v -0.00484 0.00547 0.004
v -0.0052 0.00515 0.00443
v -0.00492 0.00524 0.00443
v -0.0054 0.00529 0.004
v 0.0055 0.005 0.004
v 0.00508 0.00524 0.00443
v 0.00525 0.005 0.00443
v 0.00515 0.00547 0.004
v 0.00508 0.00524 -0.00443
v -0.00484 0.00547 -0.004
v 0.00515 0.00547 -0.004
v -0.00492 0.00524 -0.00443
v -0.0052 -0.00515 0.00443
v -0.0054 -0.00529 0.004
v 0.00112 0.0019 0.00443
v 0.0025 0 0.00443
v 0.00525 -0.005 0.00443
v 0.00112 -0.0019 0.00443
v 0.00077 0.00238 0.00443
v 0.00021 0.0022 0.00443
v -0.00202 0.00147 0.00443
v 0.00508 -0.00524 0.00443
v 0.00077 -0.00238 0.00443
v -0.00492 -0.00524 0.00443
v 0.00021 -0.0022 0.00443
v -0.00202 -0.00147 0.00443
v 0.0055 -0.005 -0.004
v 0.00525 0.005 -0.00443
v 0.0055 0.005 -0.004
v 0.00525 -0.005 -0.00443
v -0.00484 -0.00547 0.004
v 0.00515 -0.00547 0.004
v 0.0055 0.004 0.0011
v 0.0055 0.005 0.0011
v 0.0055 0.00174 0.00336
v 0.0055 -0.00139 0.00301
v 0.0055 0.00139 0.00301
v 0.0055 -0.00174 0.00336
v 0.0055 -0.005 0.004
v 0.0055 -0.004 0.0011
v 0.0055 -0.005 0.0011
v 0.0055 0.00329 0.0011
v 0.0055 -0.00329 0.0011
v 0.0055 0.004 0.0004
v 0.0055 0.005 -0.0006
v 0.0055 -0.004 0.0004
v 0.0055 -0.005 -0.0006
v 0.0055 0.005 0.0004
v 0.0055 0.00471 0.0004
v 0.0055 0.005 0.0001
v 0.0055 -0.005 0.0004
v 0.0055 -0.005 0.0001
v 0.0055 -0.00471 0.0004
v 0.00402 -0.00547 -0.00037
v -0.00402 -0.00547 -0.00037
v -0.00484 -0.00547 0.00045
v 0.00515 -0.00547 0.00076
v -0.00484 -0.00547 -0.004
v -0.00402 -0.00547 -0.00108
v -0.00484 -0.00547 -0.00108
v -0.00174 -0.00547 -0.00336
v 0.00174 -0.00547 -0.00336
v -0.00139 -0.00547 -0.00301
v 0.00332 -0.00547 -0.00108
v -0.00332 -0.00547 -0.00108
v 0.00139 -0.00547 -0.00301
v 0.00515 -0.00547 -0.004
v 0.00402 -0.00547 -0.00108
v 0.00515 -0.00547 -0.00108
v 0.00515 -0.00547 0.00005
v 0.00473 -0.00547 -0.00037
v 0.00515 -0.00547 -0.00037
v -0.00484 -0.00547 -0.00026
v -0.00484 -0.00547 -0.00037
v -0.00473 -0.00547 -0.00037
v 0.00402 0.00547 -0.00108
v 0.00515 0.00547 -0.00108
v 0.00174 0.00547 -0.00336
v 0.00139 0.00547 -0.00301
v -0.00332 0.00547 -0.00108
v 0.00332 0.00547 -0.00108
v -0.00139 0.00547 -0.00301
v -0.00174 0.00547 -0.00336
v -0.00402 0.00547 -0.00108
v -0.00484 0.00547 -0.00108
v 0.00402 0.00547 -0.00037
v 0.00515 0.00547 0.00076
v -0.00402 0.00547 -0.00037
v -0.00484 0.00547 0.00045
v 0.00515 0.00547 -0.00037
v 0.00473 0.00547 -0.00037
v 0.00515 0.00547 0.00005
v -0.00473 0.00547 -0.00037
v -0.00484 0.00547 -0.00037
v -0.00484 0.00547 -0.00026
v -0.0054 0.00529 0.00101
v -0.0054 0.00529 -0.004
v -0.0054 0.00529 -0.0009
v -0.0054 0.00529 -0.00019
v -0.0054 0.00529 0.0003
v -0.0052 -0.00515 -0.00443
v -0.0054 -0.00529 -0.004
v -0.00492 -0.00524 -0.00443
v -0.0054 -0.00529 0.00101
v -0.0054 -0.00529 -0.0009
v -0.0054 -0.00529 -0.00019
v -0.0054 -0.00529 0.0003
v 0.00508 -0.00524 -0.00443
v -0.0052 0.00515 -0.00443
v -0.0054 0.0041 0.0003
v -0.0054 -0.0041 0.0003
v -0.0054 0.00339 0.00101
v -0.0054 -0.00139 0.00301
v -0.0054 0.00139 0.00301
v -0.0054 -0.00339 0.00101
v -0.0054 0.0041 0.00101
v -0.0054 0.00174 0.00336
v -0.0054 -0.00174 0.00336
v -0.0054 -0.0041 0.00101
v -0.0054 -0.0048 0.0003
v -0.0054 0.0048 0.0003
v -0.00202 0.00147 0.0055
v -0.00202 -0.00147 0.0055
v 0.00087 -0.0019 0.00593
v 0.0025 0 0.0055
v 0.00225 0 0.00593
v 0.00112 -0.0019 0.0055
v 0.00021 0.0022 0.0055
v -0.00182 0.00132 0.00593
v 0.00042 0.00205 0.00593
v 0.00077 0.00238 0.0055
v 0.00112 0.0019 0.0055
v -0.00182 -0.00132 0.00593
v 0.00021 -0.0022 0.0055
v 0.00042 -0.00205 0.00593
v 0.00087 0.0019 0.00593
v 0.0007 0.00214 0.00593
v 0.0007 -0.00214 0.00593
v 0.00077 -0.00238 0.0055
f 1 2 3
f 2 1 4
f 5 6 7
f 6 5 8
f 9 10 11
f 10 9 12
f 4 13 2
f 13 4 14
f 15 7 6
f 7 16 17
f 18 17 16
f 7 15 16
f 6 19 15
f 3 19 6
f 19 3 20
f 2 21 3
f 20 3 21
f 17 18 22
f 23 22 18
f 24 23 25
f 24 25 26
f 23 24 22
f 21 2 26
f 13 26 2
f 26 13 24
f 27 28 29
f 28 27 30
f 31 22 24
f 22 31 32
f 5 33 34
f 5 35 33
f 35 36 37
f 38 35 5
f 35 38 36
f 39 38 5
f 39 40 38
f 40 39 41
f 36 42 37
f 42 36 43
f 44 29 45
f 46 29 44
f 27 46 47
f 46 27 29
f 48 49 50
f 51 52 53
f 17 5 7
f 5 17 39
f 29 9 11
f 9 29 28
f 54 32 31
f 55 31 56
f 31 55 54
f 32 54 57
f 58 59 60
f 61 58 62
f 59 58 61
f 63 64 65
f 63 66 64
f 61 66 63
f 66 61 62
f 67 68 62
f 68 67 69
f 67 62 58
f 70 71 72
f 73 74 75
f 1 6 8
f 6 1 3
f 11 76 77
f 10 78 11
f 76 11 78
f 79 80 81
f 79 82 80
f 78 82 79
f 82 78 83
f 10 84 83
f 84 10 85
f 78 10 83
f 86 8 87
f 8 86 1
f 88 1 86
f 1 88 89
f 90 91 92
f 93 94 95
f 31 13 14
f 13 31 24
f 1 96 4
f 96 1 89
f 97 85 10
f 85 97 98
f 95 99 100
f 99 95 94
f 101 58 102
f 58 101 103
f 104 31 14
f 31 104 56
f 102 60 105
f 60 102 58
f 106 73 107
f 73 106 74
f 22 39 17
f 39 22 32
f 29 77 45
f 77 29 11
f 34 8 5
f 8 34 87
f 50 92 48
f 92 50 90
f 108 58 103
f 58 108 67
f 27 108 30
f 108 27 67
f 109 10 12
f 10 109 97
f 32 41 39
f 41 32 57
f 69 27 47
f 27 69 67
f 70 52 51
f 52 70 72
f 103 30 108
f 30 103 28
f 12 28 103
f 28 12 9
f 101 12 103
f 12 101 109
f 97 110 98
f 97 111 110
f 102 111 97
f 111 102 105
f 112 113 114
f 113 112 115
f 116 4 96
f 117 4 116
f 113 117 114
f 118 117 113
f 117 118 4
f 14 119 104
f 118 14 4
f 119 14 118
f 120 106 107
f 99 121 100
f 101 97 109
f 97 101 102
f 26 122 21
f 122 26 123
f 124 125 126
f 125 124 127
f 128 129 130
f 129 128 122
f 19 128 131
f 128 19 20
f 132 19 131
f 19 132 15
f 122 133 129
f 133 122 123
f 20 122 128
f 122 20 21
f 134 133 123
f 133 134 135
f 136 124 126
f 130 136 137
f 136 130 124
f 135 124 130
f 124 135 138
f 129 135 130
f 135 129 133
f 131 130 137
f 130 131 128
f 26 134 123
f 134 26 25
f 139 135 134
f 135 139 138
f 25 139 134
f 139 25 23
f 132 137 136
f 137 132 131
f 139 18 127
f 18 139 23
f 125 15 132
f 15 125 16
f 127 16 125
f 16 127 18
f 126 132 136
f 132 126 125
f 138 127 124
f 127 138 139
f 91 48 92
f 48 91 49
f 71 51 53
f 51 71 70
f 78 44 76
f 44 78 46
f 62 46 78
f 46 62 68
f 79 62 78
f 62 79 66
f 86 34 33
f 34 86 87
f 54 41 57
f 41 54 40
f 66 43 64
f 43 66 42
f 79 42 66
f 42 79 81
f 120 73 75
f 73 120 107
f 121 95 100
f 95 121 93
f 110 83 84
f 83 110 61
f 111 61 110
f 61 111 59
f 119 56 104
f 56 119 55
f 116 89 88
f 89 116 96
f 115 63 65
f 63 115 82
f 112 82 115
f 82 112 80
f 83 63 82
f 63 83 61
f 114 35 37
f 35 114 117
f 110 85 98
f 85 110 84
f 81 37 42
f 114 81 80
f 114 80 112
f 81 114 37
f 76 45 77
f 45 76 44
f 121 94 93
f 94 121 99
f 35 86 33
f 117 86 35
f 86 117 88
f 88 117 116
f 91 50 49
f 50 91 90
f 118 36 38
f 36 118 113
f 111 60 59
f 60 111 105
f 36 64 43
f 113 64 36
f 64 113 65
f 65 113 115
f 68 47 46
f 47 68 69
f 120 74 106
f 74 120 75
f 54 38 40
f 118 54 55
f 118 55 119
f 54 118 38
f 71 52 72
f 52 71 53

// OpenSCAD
// Parameters
bbox_x = 0.01; //[0.005:0.02:0.0001]
bbox_y = 0.01; //[0.005:0.02:0.0001]
bbox_z = 0.01; //[0.005:0.02:0.0001]
block_x = 0.01; //[0.005:0.02:0.0001]
block_y = 0.01; //[0.005:0.02:0.0001]
block_z = 0.008; //[0.004:0.016:0.0001]
boss_d = 0.004; //[0.002:0.008:0.0001]
boss_h = 0.002; //[0.001:0.004:0.0001]
connect_overlap = 0.0005; //[0.0001:0.001:0.0001]
fillet_r = 0.0005; //[0.0001:0.001:0.0001]
chamfer_d = 0.0005; //[0.0001:0.001:0.0001]

// Base shapes
module block() {
  translate([0, 0, 0])
    cube([block_x, block_y, block_z], center=true);
}

module cylindrical_boss() {
  translate([0, 0, block_z/2 + boss_h/2 - connect_overlap])
    cylinder(h=boss_h, r=boss_d/2, center=true);
}

module fillet_sphere() {
  sphere(r=fillet_r, center=true);
}

module chamfer_wedge_xp() {
  translate([block_x/2 - chamfer_d/2, 0, 0])
    rotate([0, 45, 0])
      cube([chamfer_d, block_y + 2*chamfer_d, block_z + 2*chamfer_d], center=true);
}

module chamfer_wedge_xn() {
  translate([-block_x/2 + chamfer_d/2, 0, 0])
    rotate([0, -45, 0])
      cube([chamfer_d, block_y + 2*chamfer_d, block_z + 2*chamfer_d], center=true);
}

module chamfer_wedge_yp() {
  translate([0, block_y/2 - chamfer_d/2, 0])
    rotate([45, 0, 0])
      cube([block_x + 2*chamfer_d, chamfer_d, block_z + 2*chamfer_d], center=true);
}

module chamfer_wedge_yn() {
  translate([0, -block_y/2 + chamfer_d/2, 0])
    rotate([-45, 0, 0])
      cube([block_x + 2*chamfer_d, chamfer_d, block_z + 2*chamfer_d], center=true);
}

// Operations
module union_block_and_boss() {
  union() {
    block();
    cylindrical_boss();
  }
}

module edge_fillets() {
  minkowski() {
    union_block_and_boss();
    fillet_sphere();
  }
}

module chamfers() {
  difference() {
    edge_fillets();
    chamfer_wedge_xp();
    chamfer_wedge_xn();
    chamfer_wedge_yp();
    chamfer_wedge_yn();
  }
}

// Final output
chamfers();
